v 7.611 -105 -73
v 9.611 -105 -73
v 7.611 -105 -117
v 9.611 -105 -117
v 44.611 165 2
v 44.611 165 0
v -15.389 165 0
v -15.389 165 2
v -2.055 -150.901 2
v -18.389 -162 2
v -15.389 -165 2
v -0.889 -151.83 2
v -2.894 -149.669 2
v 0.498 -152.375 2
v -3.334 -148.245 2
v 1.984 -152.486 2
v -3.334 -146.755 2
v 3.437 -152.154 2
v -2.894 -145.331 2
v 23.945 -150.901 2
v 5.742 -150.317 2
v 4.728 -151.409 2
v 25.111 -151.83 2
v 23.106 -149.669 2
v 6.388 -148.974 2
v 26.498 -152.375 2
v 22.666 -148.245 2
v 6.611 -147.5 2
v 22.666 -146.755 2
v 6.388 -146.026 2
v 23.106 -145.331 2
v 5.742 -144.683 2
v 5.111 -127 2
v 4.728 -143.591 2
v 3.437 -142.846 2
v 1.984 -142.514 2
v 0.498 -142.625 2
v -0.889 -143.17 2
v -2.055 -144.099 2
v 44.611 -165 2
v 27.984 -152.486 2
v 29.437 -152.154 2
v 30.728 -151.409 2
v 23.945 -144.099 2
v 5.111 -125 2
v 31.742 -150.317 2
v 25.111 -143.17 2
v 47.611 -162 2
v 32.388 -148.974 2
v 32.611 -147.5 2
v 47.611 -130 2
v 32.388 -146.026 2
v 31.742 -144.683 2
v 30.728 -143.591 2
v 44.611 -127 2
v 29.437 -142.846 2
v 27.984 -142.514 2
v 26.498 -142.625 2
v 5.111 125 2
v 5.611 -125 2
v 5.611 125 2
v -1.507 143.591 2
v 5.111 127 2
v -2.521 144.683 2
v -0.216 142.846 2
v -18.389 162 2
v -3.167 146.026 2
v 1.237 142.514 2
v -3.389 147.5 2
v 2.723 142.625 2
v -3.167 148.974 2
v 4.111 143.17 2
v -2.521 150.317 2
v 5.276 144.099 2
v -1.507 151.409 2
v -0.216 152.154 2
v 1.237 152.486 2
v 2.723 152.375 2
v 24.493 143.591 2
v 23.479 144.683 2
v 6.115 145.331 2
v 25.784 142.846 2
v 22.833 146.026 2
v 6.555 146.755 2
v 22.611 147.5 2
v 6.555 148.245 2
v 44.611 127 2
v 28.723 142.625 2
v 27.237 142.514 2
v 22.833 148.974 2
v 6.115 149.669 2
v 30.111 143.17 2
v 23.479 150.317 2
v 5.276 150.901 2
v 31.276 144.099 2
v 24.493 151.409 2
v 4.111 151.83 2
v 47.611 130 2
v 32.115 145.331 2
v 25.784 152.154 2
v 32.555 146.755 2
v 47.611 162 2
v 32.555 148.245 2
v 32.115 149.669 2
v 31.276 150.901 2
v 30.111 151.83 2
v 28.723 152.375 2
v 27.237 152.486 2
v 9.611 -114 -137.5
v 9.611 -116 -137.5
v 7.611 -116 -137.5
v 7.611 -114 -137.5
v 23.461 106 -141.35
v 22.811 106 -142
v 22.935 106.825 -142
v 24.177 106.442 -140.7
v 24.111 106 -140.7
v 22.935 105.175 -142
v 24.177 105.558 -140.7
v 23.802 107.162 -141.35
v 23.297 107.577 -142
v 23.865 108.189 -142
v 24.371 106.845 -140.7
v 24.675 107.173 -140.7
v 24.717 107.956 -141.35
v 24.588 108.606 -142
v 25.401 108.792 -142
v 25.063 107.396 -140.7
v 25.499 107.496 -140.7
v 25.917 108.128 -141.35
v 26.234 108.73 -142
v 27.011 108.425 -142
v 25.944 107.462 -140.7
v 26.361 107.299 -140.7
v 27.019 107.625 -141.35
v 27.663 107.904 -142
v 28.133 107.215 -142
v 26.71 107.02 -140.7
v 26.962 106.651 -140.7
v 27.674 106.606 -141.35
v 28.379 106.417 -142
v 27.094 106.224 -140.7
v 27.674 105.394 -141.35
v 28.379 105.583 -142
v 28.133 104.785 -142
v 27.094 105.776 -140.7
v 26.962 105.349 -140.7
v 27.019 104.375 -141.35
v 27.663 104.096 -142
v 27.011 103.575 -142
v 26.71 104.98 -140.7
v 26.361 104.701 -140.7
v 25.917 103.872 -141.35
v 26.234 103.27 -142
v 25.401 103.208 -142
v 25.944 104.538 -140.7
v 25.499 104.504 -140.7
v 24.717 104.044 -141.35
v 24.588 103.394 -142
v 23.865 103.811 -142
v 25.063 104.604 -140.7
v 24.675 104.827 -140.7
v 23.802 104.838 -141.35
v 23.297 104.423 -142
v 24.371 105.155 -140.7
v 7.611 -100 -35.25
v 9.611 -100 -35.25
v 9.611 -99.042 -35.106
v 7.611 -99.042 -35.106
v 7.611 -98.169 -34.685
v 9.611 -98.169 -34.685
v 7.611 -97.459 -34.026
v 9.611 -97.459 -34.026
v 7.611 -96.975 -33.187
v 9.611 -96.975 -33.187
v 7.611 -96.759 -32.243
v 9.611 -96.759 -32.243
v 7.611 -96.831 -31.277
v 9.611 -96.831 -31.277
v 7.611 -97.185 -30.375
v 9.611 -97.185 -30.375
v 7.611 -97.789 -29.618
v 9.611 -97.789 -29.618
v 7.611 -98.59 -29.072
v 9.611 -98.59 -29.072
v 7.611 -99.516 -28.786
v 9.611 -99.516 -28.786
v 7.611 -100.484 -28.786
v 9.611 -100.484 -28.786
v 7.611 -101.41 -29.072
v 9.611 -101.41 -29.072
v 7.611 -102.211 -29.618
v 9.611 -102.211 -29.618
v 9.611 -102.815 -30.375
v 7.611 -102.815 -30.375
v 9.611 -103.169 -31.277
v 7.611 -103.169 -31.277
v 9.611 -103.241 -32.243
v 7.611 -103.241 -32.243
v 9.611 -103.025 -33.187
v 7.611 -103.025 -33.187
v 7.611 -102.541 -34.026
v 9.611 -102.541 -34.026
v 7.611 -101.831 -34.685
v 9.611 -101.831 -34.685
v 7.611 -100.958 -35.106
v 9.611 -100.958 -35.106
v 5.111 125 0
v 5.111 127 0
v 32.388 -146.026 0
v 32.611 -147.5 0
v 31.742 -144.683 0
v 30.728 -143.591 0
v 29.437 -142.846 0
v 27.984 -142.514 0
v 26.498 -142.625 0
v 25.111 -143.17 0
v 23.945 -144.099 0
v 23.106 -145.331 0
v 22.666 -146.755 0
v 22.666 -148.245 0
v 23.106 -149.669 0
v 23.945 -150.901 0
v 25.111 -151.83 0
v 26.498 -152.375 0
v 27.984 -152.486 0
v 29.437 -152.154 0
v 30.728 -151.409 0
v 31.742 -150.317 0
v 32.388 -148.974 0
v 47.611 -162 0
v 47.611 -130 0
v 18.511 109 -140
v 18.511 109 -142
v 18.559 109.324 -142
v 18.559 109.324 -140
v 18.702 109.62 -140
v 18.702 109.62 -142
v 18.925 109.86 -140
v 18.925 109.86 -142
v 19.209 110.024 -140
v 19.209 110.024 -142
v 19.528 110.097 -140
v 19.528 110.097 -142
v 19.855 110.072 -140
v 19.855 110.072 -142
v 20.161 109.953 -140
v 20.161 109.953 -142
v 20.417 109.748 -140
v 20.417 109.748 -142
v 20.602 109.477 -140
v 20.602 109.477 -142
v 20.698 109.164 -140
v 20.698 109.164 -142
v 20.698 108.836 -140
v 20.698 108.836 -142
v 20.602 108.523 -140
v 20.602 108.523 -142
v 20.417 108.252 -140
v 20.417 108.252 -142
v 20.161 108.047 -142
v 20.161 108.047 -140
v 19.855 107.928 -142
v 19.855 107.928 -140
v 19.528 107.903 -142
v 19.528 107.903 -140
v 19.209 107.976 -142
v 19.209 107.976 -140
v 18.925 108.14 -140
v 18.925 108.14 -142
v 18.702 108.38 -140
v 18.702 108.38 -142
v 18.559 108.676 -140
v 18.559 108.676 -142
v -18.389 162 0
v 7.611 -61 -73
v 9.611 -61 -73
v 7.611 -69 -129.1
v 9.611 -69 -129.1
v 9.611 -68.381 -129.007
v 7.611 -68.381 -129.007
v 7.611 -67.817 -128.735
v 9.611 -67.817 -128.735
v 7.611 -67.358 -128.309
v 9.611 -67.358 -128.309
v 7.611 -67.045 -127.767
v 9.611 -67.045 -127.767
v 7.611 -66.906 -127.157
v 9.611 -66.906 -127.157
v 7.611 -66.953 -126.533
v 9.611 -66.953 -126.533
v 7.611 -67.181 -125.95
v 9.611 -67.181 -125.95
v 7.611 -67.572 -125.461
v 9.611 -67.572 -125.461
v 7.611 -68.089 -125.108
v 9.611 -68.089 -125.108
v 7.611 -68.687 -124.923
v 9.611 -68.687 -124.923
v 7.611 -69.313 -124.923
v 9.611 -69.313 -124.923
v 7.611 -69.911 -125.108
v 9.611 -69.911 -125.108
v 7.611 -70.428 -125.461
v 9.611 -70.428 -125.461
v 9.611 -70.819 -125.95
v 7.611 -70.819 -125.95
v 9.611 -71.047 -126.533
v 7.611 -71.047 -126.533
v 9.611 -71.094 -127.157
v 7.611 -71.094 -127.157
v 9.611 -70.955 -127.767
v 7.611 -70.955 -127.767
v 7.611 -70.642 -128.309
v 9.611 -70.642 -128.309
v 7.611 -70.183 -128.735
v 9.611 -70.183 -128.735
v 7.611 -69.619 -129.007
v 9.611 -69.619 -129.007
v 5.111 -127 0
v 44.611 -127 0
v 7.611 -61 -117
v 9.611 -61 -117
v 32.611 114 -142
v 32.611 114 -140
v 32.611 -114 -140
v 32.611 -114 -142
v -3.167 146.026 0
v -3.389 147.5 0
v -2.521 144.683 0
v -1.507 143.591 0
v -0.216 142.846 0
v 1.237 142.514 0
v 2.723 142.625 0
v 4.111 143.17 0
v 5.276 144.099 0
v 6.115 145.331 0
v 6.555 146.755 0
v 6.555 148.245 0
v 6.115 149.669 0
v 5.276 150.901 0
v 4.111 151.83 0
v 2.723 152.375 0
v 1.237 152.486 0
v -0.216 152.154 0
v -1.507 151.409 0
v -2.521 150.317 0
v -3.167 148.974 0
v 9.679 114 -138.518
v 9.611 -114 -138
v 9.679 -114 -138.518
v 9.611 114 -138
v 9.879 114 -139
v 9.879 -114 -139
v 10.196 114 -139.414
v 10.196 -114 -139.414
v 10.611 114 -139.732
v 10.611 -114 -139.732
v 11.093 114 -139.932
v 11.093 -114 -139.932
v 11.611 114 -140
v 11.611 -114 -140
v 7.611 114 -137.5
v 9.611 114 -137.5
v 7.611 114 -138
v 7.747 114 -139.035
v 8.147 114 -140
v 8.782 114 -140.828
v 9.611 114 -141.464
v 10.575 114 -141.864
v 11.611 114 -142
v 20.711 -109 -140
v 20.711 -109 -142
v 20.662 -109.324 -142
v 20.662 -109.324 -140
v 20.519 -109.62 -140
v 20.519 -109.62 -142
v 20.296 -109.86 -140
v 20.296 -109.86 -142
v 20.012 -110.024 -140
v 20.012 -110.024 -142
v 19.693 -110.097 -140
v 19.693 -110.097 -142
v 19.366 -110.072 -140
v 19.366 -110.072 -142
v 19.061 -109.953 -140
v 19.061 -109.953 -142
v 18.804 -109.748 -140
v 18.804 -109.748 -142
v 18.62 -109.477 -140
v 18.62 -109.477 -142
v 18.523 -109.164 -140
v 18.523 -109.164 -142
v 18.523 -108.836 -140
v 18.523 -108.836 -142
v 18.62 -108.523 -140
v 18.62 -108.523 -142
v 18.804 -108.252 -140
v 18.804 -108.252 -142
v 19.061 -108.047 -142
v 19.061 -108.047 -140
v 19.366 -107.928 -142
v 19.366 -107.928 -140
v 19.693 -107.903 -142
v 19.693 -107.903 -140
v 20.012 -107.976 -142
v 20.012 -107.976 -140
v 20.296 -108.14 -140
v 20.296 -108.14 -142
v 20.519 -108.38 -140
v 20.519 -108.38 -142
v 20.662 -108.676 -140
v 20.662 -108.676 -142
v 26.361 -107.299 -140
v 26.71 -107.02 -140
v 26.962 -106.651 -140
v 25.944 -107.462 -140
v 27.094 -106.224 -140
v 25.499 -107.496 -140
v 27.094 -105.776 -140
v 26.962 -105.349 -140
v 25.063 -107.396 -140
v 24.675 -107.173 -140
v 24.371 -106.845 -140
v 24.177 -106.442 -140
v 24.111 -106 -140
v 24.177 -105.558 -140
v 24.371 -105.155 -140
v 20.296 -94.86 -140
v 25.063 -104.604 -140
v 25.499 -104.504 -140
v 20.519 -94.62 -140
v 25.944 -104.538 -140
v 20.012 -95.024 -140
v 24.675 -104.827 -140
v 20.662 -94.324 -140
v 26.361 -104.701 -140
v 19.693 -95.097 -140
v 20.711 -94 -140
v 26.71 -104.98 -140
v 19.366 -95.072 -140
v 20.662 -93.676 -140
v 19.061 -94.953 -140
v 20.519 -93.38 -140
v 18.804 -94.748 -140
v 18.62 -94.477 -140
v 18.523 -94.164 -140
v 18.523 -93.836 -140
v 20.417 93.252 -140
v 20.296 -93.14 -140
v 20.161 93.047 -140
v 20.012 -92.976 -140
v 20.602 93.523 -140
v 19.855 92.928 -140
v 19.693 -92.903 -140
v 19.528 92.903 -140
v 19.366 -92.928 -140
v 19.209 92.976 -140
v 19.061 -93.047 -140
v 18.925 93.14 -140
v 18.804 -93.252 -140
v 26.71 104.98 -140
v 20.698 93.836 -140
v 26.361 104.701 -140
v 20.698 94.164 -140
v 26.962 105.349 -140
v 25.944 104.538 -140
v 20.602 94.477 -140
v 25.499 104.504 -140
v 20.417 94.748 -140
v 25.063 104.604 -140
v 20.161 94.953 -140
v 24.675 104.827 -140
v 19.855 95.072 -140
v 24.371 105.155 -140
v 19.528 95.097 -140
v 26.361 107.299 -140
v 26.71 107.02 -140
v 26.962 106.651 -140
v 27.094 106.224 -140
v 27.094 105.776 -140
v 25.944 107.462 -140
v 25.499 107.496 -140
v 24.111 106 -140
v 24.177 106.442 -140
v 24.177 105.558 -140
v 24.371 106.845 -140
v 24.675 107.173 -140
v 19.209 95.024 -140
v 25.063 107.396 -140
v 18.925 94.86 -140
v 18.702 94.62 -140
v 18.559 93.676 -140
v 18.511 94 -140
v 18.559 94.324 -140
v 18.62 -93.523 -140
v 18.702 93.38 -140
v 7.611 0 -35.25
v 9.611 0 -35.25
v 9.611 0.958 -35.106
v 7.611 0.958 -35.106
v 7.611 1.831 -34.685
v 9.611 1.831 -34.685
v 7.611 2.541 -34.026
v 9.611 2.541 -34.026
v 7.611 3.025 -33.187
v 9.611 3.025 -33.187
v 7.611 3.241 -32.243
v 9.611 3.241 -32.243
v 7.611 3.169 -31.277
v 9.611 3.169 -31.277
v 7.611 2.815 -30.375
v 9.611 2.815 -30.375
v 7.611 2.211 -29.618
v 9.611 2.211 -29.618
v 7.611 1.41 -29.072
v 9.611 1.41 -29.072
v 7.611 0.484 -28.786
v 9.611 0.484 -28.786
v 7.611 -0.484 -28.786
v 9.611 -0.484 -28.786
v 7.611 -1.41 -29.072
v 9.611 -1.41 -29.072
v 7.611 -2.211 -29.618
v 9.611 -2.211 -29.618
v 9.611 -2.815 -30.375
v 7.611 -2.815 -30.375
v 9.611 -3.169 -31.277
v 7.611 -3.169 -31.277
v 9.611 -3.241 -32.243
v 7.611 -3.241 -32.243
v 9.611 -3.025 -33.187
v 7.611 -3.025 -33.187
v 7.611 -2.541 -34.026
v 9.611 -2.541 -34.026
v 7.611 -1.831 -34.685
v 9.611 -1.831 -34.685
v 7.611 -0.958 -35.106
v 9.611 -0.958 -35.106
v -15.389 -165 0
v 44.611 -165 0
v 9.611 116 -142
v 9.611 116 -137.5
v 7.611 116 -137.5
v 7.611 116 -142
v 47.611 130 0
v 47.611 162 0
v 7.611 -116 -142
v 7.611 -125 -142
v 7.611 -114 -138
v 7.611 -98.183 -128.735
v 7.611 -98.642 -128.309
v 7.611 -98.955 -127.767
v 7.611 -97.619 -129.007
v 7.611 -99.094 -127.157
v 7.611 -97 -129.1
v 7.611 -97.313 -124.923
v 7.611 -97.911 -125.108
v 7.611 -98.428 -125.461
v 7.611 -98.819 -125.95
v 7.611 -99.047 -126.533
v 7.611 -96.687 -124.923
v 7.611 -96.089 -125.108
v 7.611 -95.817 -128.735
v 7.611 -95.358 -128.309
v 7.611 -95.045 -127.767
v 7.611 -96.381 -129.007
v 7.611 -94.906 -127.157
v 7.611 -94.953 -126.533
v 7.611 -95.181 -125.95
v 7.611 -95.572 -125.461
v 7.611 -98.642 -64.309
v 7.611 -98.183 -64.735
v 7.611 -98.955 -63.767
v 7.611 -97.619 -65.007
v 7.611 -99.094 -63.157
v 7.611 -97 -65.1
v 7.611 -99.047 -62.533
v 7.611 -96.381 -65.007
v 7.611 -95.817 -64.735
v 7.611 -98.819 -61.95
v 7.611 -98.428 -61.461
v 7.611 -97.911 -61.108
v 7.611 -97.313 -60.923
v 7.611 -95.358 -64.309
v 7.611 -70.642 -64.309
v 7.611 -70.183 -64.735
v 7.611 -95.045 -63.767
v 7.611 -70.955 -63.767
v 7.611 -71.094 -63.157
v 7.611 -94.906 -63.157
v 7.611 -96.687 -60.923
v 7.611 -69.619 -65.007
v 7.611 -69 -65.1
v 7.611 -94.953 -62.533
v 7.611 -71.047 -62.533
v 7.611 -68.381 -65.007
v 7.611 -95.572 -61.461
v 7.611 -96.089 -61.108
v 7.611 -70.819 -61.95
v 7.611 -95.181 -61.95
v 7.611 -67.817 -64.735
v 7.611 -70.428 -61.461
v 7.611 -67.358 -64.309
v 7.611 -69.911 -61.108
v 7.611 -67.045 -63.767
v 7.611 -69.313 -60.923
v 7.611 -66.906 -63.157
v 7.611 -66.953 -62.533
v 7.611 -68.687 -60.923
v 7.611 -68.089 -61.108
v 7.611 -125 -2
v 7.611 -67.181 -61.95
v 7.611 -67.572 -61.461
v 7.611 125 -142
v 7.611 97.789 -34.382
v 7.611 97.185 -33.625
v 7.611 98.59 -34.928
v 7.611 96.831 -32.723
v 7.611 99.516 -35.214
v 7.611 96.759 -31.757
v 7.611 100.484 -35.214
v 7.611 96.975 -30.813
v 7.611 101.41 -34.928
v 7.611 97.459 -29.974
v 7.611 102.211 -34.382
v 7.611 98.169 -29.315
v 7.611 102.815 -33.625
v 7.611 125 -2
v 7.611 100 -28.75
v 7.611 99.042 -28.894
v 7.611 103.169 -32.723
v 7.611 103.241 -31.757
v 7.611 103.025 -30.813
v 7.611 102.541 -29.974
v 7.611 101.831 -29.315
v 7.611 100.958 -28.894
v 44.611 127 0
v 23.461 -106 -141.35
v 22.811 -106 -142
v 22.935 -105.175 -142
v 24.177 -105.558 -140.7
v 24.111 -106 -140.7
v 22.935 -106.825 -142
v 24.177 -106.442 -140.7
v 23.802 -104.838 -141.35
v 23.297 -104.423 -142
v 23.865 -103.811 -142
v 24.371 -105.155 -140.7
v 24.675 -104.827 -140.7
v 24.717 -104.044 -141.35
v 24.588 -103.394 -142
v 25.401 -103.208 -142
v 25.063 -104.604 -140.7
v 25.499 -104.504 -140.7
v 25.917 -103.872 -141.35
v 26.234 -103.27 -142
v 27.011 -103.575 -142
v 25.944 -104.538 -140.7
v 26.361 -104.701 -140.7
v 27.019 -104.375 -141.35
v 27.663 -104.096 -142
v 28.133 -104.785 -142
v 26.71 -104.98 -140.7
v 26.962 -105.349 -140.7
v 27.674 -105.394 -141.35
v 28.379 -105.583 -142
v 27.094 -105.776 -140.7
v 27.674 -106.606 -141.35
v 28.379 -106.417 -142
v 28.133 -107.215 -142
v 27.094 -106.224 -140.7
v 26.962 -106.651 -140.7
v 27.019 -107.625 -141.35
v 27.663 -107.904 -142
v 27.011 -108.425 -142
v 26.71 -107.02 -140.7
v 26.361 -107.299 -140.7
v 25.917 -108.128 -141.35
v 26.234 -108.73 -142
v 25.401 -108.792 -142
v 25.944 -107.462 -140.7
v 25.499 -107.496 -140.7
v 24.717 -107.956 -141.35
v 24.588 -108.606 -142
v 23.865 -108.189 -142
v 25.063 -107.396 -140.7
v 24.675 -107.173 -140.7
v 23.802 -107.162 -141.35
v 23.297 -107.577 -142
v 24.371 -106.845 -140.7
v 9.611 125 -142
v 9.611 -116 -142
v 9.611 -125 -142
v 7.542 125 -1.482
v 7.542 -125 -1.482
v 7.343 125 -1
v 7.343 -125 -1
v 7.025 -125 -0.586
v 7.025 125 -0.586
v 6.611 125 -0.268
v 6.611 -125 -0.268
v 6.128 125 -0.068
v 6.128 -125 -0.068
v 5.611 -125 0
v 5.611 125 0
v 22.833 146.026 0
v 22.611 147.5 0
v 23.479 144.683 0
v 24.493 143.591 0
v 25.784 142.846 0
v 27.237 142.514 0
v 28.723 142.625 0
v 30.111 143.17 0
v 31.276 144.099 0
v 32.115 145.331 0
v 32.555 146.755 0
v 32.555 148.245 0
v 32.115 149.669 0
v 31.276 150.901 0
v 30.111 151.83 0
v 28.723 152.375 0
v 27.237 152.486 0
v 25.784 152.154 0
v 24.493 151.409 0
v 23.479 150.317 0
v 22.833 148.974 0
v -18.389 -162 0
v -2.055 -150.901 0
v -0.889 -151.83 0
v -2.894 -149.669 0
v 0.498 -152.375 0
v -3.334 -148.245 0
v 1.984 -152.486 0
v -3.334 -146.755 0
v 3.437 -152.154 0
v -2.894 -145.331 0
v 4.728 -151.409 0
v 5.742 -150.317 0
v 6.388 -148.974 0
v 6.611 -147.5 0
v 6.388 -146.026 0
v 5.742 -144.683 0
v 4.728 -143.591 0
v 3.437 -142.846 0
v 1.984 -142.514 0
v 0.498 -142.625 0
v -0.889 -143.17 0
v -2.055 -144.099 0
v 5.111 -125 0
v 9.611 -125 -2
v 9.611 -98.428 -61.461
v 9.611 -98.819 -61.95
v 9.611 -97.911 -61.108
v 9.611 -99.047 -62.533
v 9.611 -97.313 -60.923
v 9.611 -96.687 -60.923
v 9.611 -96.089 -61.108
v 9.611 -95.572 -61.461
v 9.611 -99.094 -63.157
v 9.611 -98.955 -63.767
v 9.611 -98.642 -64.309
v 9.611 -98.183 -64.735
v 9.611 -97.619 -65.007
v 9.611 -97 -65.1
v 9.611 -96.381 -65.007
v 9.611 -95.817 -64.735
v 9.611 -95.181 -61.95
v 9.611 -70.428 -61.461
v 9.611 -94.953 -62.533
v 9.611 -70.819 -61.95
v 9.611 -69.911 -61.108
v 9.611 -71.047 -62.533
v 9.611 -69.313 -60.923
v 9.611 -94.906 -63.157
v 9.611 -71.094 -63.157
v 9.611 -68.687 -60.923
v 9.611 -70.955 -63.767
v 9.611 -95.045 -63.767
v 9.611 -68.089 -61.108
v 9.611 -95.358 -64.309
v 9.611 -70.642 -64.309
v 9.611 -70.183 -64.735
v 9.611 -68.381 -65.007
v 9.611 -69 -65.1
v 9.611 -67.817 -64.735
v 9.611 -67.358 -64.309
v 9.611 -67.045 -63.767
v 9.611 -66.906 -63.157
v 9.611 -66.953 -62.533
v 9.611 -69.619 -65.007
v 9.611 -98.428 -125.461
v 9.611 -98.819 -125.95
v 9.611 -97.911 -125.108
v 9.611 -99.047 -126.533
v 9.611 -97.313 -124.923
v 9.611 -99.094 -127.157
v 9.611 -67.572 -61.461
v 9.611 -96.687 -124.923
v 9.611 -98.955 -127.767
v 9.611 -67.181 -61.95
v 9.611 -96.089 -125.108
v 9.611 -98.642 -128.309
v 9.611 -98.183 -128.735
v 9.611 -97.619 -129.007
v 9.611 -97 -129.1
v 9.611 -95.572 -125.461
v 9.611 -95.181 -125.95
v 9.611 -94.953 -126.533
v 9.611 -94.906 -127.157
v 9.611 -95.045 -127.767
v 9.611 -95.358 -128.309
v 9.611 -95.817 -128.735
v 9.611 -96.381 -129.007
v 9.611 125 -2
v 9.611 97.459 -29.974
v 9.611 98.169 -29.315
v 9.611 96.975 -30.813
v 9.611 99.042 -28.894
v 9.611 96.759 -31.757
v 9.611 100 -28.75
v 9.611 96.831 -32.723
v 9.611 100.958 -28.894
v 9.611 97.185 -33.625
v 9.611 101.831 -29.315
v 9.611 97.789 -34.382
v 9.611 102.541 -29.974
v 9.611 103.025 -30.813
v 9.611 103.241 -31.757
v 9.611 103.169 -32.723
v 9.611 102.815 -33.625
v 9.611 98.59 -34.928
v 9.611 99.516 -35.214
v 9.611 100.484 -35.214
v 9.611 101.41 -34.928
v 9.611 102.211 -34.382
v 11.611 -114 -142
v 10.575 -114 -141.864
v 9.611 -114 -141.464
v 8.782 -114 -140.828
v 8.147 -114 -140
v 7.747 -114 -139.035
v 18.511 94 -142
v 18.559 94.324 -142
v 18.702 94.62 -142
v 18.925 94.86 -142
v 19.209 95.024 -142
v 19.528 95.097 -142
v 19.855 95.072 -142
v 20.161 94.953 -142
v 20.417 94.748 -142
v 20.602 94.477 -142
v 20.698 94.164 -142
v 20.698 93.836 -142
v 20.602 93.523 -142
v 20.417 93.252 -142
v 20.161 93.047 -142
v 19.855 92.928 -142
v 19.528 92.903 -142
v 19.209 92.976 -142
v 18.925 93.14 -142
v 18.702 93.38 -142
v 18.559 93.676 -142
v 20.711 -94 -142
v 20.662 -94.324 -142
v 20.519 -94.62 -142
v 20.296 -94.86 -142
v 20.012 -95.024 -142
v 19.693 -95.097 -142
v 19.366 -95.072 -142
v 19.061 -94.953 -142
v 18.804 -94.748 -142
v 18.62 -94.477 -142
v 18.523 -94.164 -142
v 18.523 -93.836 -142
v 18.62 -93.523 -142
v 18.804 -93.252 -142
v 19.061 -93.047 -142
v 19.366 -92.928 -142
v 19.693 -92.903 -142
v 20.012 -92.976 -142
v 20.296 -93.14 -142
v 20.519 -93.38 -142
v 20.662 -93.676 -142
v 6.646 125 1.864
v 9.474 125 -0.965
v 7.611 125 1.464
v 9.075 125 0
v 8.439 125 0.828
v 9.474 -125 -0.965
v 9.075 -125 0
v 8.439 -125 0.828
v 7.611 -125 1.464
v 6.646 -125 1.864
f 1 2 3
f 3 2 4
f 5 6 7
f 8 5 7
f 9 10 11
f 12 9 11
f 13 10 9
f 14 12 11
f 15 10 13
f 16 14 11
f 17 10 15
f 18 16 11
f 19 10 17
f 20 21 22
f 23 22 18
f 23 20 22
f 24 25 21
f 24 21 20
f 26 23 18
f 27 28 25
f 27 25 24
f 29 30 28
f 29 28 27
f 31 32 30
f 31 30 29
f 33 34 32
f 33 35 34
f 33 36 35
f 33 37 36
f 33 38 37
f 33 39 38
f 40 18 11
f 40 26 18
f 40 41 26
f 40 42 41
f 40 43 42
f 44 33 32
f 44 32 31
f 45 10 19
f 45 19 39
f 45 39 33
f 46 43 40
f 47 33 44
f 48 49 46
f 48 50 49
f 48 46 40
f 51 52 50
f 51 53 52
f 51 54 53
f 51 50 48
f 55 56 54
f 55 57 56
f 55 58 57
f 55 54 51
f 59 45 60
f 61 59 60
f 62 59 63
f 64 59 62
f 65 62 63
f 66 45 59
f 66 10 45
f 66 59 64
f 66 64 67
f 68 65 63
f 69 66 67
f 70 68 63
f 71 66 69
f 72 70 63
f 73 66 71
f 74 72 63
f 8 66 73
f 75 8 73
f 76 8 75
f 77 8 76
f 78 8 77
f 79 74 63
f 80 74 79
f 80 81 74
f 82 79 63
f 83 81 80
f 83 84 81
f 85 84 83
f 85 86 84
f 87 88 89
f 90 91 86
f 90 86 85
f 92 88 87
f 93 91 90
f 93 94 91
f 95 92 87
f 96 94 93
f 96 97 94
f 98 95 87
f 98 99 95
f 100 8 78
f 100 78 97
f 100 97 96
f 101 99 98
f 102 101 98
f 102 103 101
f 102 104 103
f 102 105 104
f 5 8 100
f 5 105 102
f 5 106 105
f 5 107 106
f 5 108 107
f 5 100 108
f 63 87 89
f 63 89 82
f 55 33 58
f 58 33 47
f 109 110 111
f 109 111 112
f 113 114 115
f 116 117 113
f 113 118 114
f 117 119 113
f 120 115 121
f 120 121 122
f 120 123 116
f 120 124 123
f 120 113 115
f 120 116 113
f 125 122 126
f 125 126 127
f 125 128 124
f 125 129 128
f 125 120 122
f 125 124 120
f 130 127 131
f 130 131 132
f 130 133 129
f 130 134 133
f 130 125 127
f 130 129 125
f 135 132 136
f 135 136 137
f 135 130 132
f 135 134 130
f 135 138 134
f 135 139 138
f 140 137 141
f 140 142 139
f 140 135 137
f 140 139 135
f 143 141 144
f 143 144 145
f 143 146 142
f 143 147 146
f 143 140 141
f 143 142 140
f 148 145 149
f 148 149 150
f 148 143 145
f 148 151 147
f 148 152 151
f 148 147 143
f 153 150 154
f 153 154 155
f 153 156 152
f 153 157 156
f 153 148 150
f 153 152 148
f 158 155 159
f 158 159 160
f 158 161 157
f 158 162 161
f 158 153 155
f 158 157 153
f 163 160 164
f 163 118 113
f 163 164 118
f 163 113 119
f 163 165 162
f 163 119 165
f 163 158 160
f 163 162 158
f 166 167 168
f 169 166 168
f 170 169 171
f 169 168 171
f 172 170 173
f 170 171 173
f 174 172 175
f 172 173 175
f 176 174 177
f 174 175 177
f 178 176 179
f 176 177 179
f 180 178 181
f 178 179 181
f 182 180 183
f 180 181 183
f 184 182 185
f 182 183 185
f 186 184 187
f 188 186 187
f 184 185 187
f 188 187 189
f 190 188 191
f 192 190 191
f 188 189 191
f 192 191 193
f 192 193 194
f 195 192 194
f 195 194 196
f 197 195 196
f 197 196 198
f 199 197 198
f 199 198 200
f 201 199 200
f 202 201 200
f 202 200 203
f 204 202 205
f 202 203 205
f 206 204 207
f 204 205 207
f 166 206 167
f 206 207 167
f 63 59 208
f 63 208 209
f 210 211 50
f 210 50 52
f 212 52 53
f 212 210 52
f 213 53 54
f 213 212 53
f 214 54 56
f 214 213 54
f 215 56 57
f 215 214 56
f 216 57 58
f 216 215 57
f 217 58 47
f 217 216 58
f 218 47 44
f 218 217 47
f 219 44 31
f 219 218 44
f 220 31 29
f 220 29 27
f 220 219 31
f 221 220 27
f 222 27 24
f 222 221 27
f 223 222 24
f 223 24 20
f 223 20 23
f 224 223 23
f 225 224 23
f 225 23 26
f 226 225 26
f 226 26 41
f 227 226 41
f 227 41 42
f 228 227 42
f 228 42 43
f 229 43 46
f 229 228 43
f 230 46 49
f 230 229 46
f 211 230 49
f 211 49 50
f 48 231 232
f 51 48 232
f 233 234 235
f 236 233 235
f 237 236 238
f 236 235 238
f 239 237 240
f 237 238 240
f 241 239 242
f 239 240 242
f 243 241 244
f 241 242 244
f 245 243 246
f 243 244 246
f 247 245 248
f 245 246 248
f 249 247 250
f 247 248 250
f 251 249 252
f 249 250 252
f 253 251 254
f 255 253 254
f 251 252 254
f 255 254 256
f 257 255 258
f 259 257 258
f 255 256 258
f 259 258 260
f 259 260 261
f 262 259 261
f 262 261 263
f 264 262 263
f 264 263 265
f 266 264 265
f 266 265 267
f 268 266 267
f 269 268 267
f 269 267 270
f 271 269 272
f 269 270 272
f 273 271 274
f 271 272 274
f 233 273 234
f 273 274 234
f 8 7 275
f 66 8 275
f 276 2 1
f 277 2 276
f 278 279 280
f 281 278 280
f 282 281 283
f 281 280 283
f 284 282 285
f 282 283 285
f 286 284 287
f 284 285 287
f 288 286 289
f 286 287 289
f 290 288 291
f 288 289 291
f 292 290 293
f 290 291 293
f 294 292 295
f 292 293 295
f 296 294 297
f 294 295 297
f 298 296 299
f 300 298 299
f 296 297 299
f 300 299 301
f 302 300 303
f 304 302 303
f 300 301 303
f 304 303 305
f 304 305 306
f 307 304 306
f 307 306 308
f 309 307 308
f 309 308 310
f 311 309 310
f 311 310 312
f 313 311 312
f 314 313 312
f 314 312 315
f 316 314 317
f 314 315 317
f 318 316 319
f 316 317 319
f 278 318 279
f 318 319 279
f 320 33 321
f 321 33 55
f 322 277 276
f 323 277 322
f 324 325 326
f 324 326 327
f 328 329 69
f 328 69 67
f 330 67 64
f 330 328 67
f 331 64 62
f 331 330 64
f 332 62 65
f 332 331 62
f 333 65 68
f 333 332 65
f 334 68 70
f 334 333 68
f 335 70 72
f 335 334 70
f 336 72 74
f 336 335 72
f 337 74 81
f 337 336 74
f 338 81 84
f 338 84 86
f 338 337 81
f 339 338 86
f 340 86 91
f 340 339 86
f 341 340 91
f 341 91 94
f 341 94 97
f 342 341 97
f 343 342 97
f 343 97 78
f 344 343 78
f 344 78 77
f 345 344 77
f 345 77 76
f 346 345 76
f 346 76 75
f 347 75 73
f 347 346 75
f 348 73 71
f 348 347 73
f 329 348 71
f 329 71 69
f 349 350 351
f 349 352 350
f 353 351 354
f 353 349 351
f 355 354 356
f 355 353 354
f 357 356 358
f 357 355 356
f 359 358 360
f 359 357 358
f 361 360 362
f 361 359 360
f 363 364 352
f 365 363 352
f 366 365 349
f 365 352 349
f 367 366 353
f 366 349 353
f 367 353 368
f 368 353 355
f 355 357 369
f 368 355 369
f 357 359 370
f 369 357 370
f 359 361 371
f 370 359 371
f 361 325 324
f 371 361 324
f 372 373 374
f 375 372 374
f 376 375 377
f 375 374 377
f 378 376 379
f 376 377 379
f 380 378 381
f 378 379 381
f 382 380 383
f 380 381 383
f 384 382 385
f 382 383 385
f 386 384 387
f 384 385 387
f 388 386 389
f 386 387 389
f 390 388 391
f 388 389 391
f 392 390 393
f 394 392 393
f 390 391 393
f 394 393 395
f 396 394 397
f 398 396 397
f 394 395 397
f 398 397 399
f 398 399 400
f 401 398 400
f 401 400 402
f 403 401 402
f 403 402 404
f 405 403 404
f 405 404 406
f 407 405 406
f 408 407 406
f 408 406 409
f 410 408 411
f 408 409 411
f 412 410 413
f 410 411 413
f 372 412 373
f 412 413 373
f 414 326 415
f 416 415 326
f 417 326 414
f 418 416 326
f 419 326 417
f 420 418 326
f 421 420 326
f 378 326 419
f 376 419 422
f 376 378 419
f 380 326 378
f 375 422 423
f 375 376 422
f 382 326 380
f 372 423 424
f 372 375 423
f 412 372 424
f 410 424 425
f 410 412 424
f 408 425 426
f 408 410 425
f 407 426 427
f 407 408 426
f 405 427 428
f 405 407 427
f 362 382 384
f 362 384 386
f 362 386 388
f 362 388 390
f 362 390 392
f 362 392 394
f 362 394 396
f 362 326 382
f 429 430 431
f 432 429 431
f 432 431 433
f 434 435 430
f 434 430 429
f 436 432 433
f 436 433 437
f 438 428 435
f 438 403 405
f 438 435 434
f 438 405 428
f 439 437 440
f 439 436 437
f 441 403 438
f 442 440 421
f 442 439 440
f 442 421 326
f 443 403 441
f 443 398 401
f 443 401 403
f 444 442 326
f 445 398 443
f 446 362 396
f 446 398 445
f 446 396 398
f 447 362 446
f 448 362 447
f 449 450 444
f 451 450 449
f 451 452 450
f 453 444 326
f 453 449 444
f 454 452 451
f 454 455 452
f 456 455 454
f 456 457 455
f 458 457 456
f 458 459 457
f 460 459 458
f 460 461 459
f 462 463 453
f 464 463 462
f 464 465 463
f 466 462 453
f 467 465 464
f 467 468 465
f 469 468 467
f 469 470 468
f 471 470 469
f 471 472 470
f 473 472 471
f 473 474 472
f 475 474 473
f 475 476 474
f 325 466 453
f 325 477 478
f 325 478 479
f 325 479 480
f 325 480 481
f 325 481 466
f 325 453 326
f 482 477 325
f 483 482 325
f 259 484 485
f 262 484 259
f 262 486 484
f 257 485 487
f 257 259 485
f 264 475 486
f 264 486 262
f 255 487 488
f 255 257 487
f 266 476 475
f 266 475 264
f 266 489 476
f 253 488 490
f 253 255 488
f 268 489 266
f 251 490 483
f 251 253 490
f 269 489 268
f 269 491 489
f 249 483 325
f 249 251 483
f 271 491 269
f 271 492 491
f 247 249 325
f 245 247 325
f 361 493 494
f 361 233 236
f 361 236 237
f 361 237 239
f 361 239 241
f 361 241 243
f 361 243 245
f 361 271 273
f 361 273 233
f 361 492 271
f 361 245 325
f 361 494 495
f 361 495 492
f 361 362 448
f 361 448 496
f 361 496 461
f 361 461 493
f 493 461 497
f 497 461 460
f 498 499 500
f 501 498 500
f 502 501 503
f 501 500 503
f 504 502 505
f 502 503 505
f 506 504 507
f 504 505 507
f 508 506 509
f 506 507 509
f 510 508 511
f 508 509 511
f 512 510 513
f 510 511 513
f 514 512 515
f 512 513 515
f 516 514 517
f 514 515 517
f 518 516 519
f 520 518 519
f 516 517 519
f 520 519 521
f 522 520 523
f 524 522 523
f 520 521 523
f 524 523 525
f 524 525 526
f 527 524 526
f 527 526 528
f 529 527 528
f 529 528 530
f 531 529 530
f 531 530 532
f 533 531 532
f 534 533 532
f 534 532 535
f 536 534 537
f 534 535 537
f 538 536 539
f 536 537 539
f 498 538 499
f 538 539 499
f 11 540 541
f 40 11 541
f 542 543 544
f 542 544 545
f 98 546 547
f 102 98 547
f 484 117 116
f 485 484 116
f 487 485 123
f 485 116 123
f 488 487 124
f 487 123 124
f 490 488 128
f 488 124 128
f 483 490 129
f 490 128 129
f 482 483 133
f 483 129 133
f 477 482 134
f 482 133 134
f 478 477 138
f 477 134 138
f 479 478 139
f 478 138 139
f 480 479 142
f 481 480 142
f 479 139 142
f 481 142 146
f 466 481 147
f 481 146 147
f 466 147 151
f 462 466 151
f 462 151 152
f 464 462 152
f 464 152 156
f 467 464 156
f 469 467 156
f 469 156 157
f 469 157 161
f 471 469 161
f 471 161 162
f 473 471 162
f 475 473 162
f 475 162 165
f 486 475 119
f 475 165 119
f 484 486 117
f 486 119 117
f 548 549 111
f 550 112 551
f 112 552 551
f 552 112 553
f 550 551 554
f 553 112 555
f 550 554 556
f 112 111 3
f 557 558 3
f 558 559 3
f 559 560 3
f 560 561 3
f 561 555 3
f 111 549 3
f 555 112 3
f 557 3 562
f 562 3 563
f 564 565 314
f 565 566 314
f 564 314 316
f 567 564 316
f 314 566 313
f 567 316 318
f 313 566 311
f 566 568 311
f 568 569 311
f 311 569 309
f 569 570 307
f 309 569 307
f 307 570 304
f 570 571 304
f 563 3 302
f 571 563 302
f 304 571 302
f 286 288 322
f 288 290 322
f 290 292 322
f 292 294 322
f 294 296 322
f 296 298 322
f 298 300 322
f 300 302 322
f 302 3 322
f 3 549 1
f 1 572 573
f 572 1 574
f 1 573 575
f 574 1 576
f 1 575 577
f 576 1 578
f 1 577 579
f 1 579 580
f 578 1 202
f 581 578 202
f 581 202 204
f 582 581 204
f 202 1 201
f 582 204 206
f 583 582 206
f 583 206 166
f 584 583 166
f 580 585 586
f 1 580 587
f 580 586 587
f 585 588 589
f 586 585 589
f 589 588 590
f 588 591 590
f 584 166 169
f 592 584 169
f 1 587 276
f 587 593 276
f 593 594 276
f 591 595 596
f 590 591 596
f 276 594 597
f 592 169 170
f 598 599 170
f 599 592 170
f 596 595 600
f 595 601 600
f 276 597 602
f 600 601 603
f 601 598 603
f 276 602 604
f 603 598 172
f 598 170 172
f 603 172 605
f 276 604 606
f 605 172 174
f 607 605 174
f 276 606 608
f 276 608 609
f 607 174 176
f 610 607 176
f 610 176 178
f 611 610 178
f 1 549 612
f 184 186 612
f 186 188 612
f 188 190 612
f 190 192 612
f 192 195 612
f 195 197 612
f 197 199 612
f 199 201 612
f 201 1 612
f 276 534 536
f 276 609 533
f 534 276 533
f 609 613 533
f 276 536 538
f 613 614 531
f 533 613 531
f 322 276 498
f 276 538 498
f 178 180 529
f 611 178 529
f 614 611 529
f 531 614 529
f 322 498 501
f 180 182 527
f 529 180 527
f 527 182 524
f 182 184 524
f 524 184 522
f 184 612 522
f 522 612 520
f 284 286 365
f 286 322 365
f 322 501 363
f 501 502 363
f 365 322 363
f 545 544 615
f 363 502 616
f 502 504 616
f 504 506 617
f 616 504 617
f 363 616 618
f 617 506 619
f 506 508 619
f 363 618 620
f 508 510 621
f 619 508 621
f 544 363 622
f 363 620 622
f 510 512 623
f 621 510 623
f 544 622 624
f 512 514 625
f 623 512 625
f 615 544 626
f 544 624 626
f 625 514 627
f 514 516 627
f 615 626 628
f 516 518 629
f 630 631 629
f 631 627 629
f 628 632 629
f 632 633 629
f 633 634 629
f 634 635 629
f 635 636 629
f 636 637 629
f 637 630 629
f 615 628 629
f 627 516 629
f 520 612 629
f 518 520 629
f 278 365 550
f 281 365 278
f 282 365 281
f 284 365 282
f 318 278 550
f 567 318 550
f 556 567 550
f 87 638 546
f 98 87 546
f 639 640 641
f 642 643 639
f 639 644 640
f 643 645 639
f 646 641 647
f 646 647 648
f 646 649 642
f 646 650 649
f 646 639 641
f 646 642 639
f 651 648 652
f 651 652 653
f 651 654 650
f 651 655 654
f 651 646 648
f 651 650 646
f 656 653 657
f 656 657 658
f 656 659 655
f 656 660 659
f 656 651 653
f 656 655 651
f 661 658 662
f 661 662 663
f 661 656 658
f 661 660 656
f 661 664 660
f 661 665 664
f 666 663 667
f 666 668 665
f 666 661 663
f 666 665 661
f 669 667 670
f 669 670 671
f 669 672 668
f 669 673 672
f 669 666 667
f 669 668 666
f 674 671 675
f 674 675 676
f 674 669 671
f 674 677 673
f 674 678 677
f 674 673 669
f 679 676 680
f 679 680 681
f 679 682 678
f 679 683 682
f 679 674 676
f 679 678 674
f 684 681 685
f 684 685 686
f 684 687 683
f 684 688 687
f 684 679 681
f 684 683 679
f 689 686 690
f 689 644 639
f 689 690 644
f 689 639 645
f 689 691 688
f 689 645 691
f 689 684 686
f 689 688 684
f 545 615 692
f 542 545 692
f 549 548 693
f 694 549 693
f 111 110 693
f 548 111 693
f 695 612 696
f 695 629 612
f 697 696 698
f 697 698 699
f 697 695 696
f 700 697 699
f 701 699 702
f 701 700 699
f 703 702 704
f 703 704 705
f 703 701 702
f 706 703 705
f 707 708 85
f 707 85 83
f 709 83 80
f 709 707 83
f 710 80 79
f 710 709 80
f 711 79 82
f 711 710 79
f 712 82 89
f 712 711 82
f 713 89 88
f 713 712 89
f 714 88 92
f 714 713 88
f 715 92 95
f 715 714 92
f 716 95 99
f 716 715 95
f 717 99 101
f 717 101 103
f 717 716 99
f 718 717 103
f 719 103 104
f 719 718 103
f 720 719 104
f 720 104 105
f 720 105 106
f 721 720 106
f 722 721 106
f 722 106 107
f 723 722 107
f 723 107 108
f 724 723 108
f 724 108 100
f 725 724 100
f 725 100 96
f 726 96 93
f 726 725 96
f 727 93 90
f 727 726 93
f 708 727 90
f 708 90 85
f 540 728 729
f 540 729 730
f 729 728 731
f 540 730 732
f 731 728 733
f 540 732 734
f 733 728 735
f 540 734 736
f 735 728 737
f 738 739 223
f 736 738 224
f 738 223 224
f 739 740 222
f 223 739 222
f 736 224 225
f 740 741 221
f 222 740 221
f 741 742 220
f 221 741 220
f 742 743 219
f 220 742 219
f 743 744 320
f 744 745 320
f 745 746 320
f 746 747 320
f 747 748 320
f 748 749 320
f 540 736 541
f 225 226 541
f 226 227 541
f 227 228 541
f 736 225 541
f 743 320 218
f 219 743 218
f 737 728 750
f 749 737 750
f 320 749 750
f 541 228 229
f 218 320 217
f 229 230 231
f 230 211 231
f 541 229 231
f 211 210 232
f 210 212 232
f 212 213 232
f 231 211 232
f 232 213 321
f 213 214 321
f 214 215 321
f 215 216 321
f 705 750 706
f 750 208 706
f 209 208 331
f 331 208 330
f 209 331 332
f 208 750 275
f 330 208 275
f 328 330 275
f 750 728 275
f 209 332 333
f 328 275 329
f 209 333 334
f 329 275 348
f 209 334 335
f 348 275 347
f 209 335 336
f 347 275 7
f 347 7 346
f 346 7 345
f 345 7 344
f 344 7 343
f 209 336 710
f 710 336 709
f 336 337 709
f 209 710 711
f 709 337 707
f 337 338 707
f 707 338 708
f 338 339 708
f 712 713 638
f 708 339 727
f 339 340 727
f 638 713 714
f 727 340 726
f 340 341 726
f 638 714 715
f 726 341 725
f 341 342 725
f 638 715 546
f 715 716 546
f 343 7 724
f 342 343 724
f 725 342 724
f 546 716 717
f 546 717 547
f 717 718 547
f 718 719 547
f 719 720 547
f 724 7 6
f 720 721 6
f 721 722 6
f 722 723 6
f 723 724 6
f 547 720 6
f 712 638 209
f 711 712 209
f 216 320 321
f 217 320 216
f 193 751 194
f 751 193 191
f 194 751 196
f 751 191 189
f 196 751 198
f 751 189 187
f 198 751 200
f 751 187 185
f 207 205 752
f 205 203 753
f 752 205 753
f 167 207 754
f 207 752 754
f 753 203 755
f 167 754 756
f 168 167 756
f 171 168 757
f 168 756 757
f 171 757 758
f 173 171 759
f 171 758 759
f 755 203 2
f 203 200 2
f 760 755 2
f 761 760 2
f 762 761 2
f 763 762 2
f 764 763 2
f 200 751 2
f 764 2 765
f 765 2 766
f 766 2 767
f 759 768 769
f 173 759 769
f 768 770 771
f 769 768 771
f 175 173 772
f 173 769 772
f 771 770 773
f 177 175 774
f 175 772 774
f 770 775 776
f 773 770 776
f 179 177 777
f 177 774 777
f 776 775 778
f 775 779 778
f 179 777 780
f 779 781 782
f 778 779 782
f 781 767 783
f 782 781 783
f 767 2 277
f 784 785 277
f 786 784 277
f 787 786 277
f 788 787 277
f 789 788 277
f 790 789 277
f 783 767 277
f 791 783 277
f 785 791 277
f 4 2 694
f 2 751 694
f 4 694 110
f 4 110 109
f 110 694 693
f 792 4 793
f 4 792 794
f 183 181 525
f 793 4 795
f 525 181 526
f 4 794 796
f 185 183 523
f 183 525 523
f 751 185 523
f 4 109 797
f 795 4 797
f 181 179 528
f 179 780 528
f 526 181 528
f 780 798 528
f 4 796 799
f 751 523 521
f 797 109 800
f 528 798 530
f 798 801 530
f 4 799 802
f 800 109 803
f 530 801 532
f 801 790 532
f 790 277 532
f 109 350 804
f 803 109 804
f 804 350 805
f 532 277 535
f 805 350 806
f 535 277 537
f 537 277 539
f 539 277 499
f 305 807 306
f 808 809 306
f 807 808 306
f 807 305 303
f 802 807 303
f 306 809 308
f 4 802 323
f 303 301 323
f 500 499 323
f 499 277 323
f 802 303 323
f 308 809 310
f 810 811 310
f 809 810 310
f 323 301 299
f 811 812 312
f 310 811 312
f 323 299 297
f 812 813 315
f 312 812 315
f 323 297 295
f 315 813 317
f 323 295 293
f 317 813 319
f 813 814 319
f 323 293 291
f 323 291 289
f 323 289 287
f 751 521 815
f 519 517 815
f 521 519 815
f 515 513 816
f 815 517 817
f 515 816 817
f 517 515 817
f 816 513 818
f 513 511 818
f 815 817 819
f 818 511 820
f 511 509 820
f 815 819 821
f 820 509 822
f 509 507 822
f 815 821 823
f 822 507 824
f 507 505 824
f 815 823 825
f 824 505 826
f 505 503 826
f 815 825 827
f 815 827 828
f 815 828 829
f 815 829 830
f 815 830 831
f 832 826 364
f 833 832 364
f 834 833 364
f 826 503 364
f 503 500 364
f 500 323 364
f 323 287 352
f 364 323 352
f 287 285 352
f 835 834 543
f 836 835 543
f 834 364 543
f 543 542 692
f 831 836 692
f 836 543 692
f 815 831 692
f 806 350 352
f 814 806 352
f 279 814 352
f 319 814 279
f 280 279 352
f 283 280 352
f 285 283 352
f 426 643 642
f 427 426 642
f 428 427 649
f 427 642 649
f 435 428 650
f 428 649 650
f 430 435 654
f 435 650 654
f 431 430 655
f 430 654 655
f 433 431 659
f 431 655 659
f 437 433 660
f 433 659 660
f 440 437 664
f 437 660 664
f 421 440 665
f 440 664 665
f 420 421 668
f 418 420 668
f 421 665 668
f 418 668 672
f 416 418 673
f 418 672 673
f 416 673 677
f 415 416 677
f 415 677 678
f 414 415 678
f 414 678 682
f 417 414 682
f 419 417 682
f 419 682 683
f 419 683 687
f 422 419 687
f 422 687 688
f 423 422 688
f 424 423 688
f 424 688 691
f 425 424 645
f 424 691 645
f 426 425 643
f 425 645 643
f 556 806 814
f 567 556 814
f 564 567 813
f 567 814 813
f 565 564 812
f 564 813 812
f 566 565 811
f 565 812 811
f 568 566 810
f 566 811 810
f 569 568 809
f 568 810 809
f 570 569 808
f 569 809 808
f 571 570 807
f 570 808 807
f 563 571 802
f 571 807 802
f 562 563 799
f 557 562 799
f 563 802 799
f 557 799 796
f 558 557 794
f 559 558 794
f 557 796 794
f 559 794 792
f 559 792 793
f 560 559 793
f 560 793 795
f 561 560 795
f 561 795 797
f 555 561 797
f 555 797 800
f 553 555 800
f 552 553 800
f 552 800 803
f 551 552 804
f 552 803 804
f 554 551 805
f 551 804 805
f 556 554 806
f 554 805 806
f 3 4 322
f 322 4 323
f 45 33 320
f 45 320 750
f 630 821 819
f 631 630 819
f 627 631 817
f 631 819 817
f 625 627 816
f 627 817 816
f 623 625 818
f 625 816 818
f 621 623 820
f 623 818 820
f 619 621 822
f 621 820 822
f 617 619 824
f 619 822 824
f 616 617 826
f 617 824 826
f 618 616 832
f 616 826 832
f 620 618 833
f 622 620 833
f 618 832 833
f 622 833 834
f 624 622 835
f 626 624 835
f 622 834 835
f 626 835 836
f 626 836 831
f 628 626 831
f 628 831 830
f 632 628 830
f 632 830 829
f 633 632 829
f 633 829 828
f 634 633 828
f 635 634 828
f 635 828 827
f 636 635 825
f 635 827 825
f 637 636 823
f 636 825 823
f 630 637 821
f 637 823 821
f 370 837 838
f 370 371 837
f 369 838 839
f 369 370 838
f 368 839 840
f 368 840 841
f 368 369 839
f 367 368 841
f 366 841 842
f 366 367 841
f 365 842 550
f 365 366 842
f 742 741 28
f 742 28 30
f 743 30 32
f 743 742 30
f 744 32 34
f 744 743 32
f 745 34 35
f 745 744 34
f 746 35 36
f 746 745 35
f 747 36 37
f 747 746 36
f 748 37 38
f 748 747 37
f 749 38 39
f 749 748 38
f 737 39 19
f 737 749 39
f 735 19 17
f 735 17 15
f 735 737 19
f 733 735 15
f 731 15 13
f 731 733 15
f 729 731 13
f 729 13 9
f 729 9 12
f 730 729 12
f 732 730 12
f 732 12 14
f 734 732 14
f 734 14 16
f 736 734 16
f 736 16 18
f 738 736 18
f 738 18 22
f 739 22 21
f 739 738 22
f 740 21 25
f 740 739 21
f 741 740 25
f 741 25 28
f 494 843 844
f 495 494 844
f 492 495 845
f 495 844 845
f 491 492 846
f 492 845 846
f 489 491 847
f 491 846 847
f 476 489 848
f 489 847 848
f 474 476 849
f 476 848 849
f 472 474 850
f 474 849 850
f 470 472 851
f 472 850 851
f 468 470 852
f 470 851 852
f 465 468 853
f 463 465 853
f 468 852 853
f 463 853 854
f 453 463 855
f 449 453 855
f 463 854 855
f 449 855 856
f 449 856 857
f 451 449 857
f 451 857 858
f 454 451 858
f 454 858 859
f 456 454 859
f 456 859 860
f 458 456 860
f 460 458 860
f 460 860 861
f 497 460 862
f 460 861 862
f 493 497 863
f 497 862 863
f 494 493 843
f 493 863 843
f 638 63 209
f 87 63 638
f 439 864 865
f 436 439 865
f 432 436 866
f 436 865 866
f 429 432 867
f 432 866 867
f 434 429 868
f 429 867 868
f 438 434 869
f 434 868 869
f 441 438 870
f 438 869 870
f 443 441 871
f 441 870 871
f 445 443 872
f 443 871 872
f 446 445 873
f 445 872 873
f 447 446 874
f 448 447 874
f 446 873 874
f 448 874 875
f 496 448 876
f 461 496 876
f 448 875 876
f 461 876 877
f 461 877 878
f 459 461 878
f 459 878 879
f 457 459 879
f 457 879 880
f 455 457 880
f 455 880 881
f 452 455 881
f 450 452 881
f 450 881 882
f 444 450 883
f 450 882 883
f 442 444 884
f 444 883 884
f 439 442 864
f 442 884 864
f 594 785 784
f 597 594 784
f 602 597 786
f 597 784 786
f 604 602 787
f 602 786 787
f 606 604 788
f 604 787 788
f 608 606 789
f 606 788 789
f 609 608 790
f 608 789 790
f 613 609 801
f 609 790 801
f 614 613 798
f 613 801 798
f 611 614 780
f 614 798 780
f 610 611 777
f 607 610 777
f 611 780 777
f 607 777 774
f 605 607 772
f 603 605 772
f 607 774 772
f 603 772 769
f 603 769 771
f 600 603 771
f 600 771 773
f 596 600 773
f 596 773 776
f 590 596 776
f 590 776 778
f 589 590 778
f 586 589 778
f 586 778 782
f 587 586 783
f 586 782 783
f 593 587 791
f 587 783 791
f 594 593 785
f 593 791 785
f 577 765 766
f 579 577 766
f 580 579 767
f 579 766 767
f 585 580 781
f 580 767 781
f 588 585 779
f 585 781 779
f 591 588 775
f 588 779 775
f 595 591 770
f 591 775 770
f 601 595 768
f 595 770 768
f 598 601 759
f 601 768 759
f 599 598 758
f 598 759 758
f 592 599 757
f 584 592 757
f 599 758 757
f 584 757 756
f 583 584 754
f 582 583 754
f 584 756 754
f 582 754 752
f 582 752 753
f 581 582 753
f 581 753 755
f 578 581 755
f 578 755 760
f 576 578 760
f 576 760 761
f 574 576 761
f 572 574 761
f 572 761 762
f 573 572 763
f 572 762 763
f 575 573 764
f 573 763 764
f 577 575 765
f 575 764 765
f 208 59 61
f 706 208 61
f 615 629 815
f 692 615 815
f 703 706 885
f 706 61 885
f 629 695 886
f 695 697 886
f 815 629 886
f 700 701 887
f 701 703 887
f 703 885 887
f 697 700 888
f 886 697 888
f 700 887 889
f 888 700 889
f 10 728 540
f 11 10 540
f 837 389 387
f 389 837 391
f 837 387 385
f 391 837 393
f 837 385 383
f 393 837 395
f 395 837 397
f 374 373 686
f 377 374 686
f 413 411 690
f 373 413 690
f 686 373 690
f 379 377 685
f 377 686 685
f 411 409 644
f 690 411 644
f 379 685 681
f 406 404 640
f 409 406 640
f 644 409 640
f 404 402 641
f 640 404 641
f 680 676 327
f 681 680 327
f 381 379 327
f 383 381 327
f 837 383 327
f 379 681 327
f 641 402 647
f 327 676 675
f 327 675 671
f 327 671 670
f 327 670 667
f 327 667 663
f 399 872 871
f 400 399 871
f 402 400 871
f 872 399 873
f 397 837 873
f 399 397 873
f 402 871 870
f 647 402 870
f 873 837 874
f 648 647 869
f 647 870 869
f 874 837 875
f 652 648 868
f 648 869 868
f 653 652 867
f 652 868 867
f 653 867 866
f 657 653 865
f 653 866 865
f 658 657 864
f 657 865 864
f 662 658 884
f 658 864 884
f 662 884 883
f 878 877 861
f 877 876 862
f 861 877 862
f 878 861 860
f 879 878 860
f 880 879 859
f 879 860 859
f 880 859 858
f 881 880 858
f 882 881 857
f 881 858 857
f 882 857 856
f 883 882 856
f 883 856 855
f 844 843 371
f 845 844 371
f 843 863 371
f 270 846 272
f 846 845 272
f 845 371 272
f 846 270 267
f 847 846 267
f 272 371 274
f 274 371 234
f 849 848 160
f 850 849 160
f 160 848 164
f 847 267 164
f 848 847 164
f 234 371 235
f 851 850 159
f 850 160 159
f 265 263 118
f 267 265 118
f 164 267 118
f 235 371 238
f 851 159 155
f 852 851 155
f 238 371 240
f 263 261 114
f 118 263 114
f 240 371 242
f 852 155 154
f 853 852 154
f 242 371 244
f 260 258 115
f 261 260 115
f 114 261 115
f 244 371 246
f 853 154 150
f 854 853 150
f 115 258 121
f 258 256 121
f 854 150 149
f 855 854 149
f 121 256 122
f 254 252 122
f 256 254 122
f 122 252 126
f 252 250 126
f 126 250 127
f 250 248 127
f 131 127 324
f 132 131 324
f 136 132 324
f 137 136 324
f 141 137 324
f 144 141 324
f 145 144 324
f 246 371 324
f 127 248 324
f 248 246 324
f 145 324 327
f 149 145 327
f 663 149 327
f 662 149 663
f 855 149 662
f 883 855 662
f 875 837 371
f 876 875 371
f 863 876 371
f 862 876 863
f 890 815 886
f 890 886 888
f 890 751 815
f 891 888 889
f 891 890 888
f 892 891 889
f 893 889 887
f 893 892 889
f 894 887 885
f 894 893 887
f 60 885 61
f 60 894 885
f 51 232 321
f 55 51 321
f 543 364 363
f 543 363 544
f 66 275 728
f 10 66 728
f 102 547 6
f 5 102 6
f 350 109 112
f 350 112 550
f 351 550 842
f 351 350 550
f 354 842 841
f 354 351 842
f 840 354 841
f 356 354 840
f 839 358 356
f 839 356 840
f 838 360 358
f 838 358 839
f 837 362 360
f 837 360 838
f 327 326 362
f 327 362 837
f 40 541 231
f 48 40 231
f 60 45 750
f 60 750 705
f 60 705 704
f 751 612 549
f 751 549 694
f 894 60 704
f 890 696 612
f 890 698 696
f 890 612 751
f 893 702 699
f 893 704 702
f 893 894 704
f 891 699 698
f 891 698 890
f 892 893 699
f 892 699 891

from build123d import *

# Parameters (mm, degrees)
SKETCH_1_R          = 5
EXTRUDE_1_DEPTH     = 2
SKETCH_2_W          = 2
SKETCH_2_H          = 250
EXTRUDE_2_DEPTH     = 144
SKETCH_3_W          = 2
SKETCH_3_H          = 228
EXTRUDE_3_DEPTH     = 23
SKETCH_4_W          = 4.5
SKETCH_4_H          = 2
CUT_EXTRUDE_1_DEPTH = 2
SKETCH_5_W          = 4.5
SKETCH_5_H          = 2
CUT_EXTRUDE_2_DEPTH = 2
FILLET_3_R          = 2
FILLET_4_R          = 4
SKETCH_6_R          = 1.1
SKETCH_6_R_2        = 1.5
CUT_EXTRUDE_3_DEPTH = 2
CHAMFER_1_SIZE      = 1.3
SKETCH_8_R          = 3.25
SKETCH_8_R_2        = 2.1
SKETCH_8_W          = 44
SKETCH_8_H          = 44
CUT_EXTRUDE_4_DEPTH = 2


with BuildPart() as part:
    # Эскиз1 → Вытянуть1 (new body)
    with BuildSketch(Plane.XY):
        Polygon((-15.389384289, -165), (44.610615711, -165), (47.610615711, -162), (47.610615711, -130), (44.610615711, -127), (9.610615711, -127), (9.610615711, 127), (44.610615711, 127), (47.610615711, 130), (47.610615711, 162), (44.610615711, 165), (-15.389384289, 165), (-18.389384289, 162), (-18.389384289, -162), align=None)
        with Locations((1.610615711, -147.5)):
            Circle(SKETCH_1_R, mode=Mode.SUBTRACT)
        with Locations((27.610615711, -147.5)):
            Circle(SKETCH_1_R, mode=Mode.SUBTRACT)
        with Locations(Location((27.610615711, 147.5, 0), (0, 0, 180))):
            Circle(SKETCH_1_R, mode=Mode.SUBTRACT)
        with Locations(Location((1.610615711, 147.5, 0), (0, 0, 180))):
            Circle(SKETCH_1_R, mode=Mode.SUBTRACT)
    extrude(amount=EXTRUDE_1_DEPTH)

    # Эскиз2 → Вытянуть2 (add)
    with BuildSketch(Plane.XY.offset(2)):
        with Locations((8.610615711, 0)):
            Rectangle(SKETCH_2_W, SKETCH_2_H)
    extrude(amount=-EXTRUDE_2_DEPTH)

    # Эскиз3 → Вытянуть3 (add)
    with BuildSketch(Plane(origin=(9.610615711, 0, 0), x_dir=(0, 0, -1), z_dir=(1, 0, 0))):
        with Locations((141, 0)):
            Rectangle(SKETCH_3_W, SKETCH_3_H)
    extrude(amount=EXTRUDE_3_DEPTH)

    # Эскиз4 → Вырез-Вытянуть1 (cut)
    with BuildSketch(Plane.XY.offset(2)):
        with Locations((7.360615711, 126)):
            Rectangle(SKETCH_4_W, SKETCH_4_H)
        with Locations((7.360615711, -126)):
            Rectangle(SKETCH_4_W, SKETCH_4_H)
    extrude(amount=-CUT_EXTRUDE_1_DEPTH, mode=Mode.SUBTRACT)

    # Эскиз5 → Вырез-Вытянуть2 (cut)
    with BuildSketch(Plane(origin=(9.610615711, 0, 0), x_dir=(0, 0, -1), z_dir=(1, 0, 0))):
        with Locations((139.75, -115)):
            Rectangle(SKETCH_5_W, SKETCH_5_H)
        with Locations((139.75, 115)):
            Rectangle(SKETCH_5_W, SKETCH_5_H)
    extrude(amount=-CUT_EXTRUDE_2_DEPTH, mode=Mode.SUBTRACT)

    # Скругление3
    fillet_3_edges = [part.edges().sort_by_distance(p)[0] for p in [
        (9.610615711, 0, -140),
        (7.610615711, 0, 0),
    ]]
    fillet(fillet_3_edges, radius=FILLET_3_R)

    # Скругление4
    fillet_4_edges = [part.edges().sort_by_distance(p)[0] for p in [
        (7.610615711, 0, -142),
        (9.610615711, 0, 2),
    ]]
    fillet(fillet_4_edges, radius=FILLET_4_R)

    # Эскиз6 → Вырез-Вытянуть3 (cut)
    with BuildSketch(Plane(origin=(0, 0, -142), x_dir=(-1, 0, 0), z_dir=(0, 0, -1))):
        with Locations(Location((-19.610615711, -94, 0), (0, 0, 180))):
            Circle(SKETCH_6_R)
        with Locations((-25.610615711, -106)):
            Circle(SKETCH_6_R_2)
        with Locations((-25.610615711, 106)):
            Circle(SKETCH_6_R_2)
        with Locations(Location((-19.610615711, -109, 0), (0, 0, 180))):
            Circle(SKETCH_6_R)
        with Locations((-19.610615711, 109)):
            Circle(SKETCH_6_R)
        with Locations((-19.610615711, 94)):
            Circle(SKETCH_6_R)
    extrude(amount=-CUT_EXTRUDE_3_DEPTH, mode=Mode.SUBTRACT)

    # Фаска1
    chamfer_1_edges = [part.edges().sort_by_distance(p)[0] for p in [
        (27.110615711, -106, -142),
        (27.110615711, 106, -142),
    ]]
    chamfer(chamfer_1_edges, length=CHAMFER_1_SIZE)

    # Эскиз8 → Вырез-Вытянуть4 (cut)
    with BuildSketch(Plane(origin=(9.610615711, 0, 0), x_dir=(0, 0, -1), z_dir=(1, 0, 0))):
        with Locations((32, 0)):
            Circle(SKETCH_8_R)
        with Locations((32, -100)):
            Circle(SKETCH_8_R)
        with Locations(Location((32, 100, 0), (0, 0, 180))):
            Circle(SKETCH_8_R)
        with Locations((63, -97)):
            Circle(SKETCH_8_R_2)
        with Locations((127, -97)):
            Circle(SKETCH_8_R_2)
        with Locations((127, -69)):
            Circle(SKETCH_8_R_2)
        with Locations((63, -69)):
            Circle(SKETCH_8_R_2)
        with Locations((95, -83)):
            Rectangle(SKETCH_8_W, SKETCH_8_H)
    extrude(amount=-CUT_EXTRUDE_4_DEPTH, mode=Mode.SUBTRACT)


solid = part.part
